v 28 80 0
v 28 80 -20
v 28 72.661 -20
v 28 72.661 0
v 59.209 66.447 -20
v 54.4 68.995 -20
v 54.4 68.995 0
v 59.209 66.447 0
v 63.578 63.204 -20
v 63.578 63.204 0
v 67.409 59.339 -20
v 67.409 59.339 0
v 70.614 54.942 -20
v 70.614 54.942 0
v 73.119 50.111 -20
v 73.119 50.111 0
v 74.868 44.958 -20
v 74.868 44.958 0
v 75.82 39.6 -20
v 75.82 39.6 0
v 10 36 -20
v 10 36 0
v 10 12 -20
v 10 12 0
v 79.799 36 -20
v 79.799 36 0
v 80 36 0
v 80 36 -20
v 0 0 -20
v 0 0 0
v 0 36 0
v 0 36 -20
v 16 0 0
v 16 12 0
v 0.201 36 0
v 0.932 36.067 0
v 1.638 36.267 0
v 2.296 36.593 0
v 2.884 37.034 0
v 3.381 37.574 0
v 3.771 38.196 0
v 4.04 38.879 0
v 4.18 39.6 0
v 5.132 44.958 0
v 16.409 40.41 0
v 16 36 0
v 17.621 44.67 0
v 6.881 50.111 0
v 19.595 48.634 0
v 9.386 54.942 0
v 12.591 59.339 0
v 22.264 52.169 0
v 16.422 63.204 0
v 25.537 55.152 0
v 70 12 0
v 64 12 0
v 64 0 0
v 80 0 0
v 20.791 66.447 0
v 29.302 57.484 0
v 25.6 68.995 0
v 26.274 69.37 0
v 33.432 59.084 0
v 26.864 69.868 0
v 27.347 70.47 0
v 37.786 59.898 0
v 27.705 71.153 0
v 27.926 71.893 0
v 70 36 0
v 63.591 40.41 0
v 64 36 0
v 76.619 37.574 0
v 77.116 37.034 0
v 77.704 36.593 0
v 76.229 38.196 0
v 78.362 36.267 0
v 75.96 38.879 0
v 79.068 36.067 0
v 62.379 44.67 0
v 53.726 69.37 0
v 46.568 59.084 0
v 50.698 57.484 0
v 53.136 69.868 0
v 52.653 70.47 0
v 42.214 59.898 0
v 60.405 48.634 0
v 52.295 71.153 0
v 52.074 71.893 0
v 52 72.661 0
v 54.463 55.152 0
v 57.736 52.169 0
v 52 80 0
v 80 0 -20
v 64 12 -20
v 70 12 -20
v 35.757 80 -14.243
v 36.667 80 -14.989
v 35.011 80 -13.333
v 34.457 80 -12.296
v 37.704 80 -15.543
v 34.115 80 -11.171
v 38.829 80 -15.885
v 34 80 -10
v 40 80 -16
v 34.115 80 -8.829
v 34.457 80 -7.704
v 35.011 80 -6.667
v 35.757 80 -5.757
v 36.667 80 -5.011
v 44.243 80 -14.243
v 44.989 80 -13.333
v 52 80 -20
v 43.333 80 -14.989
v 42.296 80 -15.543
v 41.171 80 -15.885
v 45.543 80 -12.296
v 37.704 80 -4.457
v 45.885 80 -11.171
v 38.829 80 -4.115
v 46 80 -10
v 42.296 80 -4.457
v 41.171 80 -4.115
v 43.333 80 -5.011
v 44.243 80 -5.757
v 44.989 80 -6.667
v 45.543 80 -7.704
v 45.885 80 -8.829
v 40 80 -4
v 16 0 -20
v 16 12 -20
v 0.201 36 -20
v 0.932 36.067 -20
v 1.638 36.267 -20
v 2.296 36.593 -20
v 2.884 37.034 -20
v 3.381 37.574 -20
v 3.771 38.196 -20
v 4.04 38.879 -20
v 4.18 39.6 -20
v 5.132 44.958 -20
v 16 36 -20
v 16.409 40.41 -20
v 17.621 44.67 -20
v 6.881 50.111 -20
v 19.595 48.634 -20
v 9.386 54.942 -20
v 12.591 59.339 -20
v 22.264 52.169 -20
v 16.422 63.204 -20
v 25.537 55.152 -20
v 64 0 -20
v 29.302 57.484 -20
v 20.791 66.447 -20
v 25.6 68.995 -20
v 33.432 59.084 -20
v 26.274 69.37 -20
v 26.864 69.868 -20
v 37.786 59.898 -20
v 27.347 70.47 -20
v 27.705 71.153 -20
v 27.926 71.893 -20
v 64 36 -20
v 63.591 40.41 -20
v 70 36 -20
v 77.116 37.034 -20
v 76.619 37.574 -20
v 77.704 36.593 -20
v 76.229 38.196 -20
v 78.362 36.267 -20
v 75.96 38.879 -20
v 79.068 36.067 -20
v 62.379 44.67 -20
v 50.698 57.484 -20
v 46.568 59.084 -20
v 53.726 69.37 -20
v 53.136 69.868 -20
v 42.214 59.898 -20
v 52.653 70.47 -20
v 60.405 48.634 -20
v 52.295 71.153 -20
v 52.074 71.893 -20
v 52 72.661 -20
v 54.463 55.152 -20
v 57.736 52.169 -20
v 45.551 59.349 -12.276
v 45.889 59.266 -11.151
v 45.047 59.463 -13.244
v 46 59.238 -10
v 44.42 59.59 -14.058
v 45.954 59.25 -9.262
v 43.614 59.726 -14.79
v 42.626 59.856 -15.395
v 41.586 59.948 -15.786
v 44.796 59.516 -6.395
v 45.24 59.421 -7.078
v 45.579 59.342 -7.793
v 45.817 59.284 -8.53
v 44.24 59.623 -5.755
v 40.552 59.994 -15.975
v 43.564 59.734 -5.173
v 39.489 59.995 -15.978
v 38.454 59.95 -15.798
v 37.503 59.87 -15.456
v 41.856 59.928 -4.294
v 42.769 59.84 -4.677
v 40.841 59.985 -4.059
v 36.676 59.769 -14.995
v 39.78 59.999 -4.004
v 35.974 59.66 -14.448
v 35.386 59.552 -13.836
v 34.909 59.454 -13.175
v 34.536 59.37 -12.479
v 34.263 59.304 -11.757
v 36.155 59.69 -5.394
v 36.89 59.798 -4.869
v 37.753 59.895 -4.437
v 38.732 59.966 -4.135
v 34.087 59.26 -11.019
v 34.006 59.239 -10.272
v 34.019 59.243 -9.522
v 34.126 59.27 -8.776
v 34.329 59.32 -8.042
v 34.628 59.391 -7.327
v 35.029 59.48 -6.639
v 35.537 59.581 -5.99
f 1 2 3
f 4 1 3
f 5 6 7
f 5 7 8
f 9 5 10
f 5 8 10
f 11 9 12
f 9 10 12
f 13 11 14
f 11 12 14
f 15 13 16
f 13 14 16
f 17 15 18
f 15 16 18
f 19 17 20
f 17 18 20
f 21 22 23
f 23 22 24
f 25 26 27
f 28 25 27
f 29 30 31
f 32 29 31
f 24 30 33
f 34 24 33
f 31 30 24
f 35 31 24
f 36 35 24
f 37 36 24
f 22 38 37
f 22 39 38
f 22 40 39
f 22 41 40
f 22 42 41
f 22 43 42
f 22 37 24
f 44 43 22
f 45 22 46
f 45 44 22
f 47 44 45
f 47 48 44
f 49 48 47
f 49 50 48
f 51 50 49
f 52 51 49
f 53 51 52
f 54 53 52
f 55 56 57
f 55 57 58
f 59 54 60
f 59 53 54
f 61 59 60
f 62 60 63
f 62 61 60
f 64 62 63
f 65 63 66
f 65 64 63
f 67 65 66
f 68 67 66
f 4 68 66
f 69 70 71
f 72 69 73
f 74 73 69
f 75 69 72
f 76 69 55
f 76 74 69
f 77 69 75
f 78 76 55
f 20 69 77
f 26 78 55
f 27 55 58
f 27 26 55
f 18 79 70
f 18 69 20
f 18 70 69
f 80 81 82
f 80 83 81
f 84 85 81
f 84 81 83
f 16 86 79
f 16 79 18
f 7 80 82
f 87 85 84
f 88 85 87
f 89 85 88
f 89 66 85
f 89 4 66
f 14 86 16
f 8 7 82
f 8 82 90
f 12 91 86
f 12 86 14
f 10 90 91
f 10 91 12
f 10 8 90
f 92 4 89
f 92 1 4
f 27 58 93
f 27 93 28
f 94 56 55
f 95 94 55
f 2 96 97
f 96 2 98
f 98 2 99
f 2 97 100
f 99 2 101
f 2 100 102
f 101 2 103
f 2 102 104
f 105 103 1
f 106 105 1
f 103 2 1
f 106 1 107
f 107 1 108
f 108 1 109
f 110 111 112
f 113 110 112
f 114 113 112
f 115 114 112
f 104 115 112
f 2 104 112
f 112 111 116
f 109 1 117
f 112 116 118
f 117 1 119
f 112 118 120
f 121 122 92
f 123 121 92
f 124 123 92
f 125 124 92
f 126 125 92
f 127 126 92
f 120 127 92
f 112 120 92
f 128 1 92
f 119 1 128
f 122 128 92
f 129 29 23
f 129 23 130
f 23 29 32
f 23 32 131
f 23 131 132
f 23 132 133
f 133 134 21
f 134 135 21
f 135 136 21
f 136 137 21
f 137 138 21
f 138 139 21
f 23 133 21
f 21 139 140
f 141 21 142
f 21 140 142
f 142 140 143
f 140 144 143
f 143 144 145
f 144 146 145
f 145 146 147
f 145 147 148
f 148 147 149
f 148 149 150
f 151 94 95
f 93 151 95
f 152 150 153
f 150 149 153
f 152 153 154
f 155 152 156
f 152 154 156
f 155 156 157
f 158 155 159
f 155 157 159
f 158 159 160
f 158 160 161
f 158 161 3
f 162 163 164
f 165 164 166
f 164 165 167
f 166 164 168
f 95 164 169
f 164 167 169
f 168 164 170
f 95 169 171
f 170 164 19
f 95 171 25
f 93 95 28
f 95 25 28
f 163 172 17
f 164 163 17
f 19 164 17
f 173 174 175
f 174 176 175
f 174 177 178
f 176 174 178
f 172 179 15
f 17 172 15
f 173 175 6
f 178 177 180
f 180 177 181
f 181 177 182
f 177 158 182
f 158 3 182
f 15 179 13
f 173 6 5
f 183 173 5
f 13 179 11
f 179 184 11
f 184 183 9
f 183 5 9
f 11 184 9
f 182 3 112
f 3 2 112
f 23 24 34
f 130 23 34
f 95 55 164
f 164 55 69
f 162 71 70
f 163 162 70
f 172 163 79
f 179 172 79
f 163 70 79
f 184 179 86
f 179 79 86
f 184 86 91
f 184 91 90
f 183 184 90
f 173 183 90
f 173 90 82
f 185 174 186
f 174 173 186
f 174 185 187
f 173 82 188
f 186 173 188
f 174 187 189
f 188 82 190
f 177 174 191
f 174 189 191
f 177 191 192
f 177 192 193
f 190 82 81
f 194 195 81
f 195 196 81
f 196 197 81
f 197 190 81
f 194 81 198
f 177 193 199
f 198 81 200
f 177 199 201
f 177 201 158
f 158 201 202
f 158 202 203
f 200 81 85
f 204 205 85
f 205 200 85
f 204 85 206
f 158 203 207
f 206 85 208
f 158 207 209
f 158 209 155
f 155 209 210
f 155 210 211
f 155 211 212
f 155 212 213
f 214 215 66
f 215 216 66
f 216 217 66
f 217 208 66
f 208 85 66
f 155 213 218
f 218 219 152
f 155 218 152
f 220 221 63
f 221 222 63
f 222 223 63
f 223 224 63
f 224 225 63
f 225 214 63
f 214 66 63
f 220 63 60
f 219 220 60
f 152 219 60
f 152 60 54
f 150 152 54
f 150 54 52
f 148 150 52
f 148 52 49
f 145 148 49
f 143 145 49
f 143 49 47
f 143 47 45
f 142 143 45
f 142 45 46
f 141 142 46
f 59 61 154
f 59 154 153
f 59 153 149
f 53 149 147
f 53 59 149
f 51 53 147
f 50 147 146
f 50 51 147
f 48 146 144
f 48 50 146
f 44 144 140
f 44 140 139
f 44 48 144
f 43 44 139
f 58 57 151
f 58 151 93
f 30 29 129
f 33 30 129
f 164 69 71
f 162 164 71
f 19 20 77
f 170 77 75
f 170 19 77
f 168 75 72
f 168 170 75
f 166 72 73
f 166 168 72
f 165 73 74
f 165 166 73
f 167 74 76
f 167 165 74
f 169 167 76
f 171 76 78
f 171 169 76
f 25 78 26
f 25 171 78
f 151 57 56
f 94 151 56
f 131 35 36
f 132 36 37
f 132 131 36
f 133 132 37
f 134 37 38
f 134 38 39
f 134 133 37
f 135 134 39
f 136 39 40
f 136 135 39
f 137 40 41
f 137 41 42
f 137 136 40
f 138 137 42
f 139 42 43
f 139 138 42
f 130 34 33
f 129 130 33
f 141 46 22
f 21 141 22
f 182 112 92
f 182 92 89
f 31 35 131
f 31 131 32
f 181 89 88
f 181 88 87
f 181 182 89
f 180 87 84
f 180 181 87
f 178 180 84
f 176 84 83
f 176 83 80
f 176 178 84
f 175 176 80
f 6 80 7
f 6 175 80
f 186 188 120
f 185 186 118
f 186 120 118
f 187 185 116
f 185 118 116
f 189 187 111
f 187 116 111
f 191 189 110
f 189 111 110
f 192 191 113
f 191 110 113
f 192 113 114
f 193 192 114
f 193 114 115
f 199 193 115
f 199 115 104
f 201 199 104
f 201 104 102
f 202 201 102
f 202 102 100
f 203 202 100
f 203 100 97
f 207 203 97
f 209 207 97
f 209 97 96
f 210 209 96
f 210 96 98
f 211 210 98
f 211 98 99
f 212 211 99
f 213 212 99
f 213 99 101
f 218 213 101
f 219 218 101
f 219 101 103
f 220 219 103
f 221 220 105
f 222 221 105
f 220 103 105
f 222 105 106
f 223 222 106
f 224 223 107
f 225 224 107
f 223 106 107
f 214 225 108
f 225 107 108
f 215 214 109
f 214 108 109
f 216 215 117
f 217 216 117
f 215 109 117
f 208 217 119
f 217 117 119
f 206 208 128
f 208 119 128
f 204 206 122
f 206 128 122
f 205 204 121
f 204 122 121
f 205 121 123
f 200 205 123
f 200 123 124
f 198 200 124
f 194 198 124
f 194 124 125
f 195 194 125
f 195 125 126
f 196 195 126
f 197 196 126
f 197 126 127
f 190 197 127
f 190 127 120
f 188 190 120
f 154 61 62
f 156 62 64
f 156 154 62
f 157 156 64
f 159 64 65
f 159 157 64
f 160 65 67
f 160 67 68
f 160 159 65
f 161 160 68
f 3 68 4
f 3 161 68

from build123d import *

# Parameters (mm, degrees)
SKETCH1_W           = 80
SKETCH1_H           = 80
BOSS_EXTRUDE1_DEPTH = 20
CUT_EXTRUDE1_DEPTH  = 21
SKETCH3_R           = 24
CUT_EXTRUDE2_DEPTH  = 21
CUT_EXTRUDE3_DEPTH  = 21
SKETCH5_R           = 6
CUT_EXTRUDE4_DEPTH  = 81
FILLET1_R           = 4


with BuildPart() as part:
    # Sketch1 → Boss-Extrude1 (new body)
    with BuildSketch(Plane.XY):
        with Locations((40, 40)):
            Rectangle(SKETCH1_W, SKETCH1_H)
    extrude(amount=-BOSS_EXTRUDE1_DEPTH)

    # Sketch2 → Cut-Extrude1 (cut, through all)
    with BuildSketch(Plane.XY):
        Polygon((16, 0), (64, 0), (64, 12), (70, 12), (70, 36), (10, 36), (10, 12), (16, 12), align=None)
    extrude(amount=-CUT_EXTRUDE1_DEPTH, mode=Mode.SUBTRACT)

    # Sketch3 → Cut-Extrude2 (cut, through all)
    with BuildSketch(Plane.XY):
        with Locations((40, 36)):
            Circle(SKETCH3_R)
    extrude(amount=-CUT_EXTRUDE2_DEPTH, mode=Mode.SUBTRACT)

    # Sketch4 → Cut-Extrude3 (cut, through all)
    with BuildSketch(Plane.XY):
        with BuildLine():
            Line((4, 36), (0, 36))
            Line((0, 36), (0, 80))
            Line((0, 80), (28, 80))
            Line((28, 80), (28, 69.941125497))
            ThreePointArc((28, 69.941125497), (10.606123087, 56.784609691), (4, 36))
        make_face()
        with BuildLine():
            Line((76, 36), (80, 36))
            Line((80, 36), (80, 80))
            Line((80, 80), (52, 80))
            Line((52, 80), (52, 69.941125497))
            ThreePointArc((52, 69.941125497), (69.393876913, 56.784609691), (76, 36))
        make_face()
    extrude(amount=-CUT_EXTRUDE3_DEPTH, mode=Mode.SUBTRACT)

    # Sketch5 → Cut-Extrude4 (cut, through all)
    with BuildSketch(Plane(origin=(0, 80, 0), x_dir=(1, 0, 0), z_dir=(0, 1, 0))):
        with Locations((40, 10)):
            Circle(SKETCH5_R)
    extrude(amount=-CUT_EXTRUDE4_DEPTH, mode=Mode.SUBTRACT)

    # Fillet1
    fillet1_edges = [part.edges().sort_by_distance(p)[0] for p in [
        (76, 36, -10),
        (52, 69.941125497, -10),
        (28, 69.941125497, -10),
        (4, 36, -10),
    ]]
    fillet(fillet1_edges, radius=FILLET1_R)


solid = part.part
